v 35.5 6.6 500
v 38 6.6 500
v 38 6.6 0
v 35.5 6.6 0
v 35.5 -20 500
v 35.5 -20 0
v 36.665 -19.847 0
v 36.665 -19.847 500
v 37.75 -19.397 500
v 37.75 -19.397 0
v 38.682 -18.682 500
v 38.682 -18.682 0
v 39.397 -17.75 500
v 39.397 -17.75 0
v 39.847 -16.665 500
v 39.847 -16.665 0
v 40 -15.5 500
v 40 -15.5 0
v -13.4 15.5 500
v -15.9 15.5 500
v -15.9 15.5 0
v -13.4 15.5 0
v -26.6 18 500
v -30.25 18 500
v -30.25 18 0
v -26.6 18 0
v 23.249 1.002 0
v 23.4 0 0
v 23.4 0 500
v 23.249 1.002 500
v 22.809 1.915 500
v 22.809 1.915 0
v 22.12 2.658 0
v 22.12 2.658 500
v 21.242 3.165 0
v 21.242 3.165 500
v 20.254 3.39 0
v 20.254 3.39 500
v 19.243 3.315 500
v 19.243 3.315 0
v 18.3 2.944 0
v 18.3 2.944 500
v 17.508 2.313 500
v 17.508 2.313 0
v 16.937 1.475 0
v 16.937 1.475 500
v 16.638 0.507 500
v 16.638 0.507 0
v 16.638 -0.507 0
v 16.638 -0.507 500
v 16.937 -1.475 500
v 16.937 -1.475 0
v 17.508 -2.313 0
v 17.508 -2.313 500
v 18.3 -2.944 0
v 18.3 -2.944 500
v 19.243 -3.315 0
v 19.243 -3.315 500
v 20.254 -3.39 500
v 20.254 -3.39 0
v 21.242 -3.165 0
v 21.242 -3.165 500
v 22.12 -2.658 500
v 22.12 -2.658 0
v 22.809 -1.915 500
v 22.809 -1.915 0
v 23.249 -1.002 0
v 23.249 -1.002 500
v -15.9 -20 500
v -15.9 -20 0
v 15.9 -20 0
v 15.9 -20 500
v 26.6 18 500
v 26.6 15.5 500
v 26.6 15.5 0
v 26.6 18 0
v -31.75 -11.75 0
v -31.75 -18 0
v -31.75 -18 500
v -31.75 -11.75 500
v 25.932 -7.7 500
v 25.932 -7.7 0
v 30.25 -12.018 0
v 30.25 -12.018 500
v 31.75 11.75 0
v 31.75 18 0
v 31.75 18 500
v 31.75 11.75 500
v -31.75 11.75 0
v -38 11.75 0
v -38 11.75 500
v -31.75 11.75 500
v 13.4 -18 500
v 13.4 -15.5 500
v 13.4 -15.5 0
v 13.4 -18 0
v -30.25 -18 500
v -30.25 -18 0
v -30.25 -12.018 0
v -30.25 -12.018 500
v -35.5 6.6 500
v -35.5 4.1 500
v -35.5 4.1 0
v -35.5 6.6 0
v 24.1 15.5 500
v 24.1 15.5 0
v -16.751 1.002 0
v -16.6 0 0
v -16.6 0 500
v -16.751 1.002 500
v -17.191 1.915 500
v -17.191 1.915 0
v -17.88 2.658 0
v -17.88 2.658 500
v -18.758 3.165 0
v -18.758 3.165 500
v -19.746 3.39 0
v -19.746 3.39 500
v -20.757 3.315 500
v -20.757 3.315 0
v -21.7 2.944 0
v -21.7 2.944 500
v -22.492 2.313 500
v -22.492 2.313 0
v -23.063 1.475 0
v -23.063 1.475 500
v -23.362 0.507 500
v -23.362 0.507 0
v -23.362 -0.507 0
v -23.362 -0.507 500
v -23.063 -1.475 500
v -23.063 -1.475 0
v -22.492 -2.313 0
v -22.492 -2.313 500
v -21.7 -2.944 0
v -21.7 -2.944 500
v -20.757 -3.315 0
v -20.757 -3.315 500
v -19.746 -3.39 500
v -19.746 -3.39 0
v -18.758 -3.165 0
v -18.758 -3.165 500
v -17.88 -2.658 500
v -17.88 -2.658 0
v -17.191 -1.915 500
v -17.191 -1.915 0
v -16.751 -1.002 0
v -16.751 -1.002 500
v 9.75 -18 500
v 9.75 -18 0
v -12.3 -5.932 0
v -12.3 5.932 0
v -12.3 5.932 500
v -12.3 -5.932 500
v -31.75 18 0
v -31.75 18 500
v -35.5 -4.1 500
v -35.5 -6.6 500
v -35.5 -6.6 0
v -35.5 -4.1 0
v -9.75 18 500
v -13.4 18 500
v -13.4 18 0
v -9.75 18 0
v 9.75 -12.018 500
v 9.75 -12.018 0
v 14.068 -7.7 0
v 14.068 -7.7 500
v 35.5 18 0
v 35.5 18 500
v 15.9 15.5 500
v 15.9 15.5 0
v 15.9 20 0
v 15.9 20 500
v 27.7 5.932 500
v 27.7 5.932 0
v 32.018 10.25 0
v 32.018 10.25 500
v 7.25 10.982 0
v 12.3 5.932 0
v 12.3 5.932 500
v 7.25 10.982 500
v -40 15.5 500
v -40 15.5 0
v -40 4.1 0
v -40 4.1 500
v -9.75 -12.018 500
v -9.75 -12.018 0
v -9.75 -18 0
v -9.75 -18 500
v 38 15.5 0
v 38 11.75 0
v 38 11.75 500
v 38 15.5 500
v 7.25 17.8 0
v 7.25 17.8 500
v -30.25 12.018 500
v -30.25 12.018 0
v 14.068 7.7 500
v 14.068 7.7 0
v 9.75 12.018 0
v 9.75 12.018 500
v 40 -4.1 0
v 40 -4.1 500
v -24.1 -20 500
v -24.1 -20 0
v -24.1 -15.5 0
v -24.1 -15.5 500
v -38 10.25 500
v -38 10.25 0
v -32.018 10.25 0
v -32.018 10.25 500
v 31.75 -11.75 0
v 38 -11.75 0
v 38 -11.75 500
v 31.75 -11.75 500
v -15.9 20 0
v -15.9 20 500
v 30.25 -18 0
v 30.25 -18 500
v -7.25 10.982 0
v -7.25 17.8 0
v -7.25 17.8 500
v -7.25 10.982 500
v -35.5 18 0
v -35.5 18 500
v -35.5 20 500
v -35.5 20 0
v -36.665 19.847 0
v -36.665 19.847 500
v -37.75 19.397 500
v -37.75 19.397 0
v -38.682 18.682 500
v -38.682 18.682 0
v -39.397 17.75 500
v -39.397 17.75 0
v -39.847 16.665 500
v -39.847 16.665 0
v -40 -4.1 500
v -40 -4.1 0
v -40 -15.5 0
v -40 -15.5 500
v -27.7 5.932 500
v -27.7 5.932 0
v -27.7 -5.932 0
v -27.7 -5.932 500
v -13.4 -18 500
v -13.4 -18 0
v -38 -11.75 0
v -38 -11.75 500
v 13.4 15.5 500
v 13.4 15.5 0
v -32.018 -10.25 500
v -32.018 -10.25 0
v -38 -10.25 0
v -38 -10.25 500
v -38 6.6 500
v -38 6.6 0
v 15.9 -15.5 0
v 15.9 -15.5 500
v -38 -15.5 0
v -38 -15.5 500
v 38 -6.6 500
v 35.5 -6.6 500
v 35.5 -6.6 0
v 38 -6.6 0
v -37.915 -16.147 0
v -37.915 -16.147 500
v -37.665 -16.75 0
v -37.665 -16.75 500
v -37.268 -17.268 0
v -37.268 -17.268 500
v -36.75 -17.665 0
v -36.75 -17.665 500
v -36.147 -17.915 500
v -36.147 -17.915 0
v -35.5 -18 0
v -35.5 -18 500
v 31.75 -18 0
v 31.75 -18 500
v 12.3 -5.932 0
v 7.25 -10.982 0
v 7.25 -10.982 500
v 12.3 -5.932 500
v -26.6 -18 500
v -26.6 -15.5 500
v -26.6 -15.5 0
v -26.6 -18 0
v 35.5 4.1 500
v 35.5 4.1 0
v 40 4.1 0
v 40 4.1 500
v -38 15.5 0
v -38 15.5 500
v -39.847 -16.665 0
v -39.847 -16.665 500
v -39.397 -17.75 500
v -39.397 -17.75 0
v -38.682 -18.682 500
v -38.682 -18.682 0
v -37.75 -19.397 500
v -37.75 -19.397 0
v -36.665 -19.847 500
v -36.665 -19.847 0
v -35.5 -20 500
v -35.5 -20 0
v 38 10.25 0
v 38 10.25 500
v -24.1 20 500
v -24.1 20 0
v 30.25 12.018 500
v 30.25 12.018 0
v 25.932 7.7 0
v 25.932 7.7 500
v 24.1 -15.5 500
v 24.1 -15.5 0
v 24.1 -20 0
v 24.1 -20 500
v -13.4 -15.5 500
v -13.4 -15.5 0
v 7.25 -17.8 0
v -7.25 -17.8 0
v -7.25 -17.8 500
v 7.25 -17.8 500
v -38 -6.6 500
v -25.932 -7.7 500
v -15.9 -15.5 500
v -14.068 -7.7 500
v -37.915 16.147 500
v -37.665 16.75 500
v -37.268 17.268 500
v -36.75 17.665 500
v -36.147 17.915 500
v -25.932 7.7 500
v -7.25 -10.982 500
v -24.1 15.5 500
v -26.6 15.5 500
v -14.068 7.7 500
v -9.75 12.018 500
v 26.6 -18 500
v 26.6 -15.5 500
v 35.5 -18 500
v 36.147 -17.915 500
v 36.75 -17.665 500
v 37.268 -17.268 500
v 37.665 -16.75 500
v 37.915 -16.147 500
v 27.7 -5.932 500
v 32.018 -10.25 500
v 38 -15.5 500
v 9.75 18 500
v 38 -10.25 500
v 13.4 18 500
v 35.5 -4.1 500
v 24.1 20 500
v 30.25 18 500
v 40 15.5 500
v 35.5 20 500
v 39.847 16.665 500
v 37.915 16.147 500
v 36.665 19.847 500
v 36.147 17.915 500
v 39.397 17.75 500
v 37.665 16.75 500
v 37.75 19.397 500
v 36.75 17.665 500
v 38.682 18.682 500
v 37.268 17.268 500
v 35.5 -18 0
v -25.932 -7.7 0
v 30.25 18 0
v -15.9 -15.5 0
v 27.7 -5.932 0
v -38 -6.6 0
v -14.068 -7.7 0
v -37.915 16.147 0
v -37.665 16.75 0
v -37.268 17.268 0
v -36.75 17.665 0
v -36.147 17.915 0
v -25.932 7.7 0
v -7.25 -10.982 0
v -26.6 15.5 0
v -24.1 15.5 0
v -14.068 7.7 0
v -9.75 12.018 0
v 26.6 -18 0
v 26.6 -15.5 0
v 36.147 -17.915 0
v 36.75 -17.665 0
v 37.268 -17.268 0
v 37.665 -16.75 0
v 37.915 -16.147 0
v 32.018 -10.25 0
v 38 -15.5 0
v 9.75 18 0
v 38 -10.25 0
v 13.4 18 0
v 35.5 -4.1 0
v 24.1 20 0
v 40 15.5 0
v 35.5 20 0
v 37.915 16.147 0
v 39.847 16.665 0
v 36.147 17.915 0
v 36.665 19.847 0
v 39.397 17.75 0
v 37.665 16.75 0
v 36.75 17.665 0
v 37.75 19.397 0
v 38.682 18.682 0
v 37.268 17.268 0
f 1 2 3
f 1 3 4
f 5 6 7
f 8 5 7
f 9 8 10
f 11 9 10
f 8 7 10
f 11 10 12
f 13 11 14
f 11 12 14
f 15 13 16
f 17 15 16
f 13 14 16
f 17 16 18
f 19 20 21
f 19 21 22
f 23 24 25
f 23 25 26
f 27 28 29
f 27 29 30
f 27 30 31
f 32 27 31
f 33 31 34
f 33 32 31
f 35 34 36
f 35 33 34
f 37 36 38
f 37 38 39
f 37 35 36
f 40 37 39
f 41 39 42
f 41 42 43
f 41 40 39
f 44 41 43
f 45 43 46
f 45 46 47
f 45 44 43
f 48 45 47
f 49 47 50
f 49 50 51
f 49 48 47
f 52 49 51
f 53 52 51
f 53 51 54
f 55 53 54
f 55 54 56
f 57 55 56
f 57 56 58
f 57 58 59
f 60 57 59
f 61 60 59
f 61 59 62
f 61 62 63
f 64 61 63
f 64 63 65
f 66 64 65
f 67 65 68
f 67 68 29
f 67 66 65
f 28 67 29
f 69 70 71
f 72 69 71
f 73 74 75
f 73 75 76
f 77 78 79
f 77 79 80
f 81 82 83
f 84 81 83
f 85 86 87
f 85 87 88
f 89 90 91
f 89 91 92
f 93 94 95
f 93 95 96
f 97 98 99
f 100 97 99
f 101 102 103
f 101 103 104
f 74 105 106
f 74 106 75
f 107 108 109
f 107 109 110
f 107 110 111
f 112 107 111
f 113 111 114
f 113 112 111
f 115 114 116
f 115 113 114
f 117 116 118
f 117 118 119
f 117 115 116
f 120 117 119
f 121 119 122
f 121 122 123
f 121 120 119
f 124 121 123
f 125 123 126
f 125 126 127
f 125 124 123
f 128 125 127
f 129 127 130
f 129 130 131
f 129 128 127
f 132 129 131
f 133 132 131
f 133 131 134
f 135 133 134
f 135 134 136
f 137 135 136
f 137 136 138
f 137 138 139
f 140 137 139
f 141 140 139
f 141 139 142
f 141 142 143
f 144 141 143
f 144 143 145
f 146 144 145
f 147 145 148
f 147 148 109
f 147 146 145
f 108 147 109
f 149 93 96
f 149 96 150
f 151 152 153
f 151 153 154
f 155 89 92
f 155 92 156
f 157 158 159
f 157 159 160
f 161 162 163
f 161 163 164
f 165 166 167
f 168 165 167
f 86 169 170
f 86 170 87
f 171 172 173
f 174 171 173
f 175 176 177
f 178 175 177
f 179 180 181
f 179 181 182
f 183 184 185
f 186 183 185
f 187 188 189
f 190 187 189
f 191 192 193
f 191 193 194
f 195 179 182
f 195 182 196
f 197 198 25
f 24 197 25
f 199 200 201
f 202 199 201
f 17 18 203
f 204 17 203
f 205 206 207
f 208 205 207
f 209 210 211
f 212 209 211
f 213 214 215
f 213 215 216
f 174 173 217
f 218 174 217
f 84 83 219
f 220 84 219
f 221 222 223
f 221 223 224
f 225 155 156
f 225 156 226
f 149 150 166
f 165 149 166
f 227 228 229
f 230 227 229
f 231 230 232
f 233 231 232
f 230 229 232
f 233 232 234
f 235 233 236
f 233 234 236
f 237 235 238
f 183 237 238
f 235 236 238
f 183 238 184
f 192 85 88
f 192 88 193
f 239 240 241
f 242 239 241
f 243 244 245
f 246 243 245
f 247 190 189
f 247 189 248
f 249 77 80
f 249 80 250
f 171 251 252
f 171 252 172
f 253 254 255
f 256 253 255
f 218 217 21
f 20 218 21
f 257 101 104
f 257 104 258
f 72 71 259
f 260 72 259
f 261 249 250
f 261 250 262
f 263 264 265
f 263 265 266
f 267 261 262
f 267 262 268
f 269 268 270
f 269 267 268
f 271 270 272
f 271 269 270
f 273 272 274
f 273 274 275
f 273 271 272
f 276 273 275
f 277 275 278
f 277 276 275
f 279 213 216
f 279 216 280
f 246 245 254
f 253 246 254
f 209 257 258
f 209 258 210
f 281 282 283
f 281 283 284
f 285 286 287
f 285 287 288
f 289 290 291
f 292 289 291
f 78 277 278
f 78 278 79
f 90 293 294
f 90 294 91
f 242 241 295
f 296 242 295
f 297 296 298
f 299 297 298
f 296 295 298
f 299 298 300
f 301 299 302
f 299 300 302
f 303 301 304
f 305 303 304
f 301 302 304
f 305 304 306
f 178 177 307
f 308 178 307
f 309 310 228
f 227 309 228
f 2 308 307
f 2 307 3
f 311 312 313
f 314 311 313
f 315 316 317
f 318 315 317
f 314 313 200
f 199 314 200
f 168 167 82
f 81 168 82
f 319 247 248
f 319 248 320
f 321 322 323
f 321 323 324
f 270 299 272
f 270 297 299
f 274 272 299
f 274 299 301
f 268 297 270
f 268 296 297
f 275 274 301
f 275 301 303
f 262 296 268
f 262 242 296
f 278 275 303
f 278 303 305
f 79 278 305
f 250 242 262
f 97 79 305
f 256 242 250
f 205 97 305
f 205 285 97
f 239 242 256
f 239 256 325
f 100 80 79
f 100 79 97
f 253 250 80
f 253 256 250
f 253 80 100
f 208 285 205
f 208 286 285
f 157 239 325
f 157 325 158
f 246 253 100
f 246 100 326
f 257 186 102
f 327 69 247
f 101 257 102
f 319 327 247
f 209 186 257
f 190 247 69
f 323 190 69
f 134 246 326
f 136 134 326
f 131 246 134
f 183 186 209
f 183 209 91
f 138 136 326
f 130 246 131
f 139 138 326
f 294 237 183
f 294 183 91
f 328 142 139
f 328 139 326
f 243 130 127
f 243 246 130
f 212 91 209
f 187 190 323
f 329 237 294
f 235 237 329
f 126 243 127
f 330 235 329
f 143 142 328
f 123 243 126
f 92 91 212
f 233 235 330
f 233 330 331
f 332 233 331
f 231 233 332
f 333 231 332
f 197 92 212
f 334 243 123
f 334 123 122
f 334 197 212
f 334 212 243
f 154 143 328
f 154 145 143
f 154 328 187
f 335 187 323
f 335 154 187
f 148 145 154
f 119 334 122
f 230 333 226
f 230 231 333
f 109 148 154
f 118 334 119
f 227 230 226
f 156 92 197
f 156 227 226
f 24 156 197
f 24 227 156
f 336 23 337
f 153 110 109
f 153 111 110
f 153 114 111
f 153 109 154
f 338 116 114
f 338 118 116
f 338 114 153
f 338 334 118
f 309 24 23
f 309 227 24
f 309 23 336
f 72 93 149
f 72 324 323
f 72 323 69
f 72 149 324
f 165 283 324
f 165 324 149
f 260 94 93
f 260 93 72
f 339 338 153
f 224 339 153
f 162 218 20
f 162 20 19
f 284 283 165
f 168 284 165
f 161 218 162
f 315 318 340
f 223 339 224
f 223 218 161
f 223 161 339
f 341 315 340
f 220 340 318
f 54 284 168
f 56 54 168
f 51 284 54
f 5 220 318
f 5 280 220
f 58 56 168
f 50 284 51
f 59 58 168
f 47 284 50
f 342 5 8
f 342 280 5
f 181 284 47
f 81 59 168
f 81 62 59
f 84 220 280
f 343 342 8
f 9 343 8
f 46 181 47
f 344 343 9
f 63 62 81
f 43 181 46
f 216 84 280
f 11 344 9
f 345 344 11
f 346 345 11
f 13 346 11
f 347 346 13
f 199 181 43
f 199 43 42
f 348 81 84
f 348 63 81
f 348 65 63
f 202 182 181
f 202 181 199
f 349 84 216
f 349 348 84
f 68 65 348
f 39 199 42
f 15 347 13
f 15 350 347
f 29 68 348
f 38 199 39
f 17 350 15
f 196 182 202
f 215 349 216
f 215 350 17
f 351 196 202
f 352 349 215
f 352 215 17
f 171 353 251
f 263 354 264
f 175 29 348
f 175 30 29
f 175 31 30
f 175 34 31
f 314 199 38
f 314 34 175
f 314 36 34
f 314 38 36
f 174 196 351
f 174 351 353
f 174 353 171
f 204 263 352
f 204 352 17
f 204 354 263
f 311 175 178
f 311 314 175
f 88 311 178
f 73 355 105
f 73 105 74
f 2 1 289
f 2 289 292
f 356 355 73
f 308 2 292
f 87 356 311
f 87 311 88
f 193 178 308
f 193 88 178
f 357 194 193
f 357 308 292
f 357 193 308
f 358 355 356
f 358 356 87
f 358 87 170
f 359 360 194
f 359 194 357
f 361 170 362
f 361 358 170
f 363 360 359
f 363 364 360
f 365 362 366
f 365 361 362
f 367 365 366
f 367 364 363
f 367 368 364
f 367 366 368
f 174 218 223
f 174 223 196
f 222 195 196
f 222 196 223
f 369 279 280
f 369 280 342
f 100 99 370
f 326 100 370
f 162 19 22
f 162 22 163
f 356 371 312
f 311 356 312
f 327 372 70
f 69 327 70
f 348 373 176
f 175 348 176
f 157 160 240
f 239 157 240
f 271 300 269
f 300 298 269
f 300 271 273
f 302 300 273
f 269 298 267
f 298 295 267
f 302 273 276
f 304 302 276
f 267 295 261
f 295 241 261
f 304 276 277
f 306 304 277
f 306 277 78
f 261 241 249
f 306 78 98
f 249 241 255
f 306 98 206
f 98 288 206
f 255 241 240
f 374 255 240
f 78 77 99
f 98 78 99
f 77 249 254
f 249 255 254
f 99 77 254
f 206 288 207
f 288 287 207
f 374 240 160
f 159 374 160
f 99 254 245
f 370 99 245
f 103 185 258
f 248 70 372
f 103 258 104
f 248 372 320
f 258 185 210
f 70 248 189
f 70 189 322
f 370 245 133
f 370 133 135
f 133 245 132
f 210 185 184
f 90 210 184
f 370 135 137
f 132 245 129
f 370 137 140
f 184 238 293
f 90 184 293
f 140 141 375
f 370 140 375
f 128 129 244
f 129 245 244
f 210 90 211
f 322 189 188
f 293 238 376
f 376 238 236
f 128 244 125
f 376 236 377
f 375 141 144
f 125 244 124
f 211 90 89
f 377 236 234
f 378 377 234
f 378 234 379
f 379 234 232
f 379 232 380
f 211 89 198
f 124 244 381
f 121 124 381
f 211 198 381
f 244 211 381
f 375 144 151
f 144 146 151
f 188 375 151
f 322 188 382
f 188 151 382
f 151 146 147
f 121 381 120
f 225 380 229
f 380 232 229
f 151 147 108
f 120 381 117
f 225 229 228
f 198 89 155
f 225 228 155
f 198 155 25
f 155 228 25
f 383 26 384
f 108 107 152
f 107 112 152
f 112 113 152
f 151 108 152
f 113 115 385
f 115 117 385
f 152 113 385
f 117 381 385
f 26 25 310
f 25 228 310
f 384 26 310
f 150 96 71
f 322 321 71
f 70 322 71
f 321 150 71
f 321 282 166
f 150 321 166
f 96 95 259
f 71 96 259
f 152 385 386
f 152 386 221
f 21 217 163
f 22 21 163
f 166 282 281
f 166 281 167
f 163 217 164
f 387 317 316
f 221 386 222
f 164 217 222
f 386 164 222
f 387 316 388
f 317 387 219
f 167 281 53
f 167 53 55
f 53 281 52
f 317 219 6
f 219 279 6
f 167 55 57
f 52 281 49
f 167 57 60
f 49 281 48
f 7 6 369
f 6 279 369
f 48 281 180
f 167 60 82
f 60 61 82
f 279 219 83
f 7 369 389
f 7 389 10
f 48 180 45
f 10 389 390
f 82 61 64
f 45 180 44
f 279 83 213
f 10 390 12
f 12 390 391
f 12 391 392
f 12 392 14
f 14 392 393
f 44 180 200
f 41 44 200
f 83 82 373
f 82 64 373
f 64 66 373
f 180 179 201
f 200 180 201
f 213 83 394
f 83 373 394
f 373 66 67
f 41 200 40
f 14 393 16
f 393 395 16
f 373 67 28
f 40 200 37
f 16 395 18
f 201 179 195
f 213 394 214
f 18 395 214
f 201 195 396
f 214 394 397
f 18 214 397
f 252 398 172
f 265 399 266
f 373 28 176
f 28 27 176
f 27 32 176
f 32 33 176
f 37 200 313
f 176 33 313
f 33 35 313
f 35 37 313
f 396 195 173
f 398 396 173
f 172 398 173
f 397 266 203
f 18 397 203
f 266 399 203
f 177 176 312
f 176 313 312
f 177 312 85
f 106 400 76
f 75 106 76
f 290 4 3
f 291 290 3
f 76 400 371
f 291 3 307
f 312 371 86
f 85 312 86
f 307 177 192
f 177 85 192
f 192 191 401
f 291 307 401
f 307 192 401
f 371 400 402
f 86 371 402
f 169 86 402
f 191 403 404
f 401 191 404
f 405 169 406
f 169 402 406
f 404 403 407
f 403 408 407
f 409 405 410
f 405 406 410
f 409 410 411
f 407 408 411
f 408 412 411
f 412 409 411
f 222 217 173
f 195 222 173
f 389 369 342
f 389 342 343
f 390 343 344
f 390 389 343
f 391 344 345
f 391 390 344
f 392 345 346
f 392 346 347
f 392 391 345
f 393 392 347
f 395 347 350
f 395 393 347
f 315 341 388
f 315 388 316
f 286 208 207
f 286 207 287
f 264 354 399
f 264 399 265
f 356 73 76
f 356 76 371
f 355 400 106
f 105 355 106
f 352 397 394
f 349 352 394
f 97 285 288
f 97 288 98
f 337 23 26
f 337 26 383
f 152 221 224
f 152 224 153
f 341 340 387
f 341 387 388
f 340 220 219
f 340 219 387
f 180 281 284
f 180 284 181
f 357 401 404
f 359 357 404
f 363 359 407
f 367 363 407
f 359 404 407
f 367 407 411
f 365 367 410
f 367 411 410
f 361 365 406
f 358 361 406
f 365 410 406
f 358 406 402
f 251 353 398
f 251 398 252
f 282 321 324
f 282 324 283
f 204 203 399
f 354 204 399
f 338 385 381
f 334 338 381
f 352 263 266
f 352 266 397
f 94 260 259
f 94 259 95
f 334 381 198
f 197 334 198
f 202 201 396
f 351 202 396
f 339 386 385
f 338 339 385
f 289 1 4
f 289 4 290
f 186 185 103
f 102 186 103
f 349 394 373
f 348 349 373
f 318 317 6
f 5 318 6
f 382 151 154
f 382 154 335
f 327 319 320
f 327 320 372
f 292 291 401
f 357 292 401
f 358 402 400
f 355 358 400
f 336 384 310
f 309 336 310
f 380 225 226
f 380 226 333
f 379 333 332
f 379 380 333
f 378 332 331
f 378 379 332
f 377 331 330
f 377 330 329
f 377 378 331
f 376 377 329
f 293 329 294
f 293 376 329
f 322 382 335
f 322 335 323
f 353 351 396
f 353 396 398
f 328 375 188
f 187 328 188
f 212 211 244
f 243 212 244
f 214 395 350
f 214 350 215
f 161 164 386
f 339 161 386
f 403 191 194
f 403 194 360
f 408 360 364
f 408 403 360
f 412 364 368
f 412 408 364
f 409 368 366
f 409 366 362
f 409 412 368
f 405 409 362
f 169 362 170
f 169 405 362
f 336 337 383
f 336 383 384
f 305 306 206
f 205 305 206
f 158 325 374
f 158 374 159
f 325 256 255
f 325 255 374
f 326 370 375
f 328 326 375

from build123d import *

# Parameters (mm, degrees)
SKETCH1_R           = 3.4
BOSS_EXTRUDE1_DEPTH = 500


with BuildPart() as part:
    # Sketch1 → Boss-Extrude1 (new body)
    with BuildSketch(Plane.XY):
        with BuildLine():
            Line((24.1, -20), (35.5, -20))
            ThreePointArc((35.5, -20), (38.681980515, -18.681980515), (40, -15.5))
            Line((40, -15.5), (40, -4.1))
            Line((40, -4.1), (35.5, -4.1))
            Line((35.5, -4.1), (35.5, -6.6))
            Line((35.5, -6.6), (38, -6.6))
            Line((38, -6.6), (38, -10.25))
            Line((38, -10.25), (32.017766953, -10.25))
            Line((32.017766953, -10.25), (27.7, -5.932233047))
            Line((27.7, -5.932233047), (27.7, 5.932233047))
            Line((27.7, 5.932233047), (32.017766953, 10.25))
            Line((32.017766953, 10.25), (38, 10.25))
            Line((38, 10.25), (38, 6.6))
            Line((38, 6.6), (35.5, 6.6))
            Line((35.5, 6.6), (35.5, 4.1))
            Line((35.5, 4.1), (40, 4.1))
            Line((40, 4.1), (40, 15.5))
            ThreePointArc((40, 15.5), (38.681980515, 18.681980515), (35.5, 20))
            Line((35.5, 20), (24.1, 20))
            Line((24.1, 20), (24.1, 15.5))
            Line((24.1, 15.5), (26.6, 15.5))
            Line((26.6, 15.5), (26.6, 18))
            Line((26.6, 18), (30.25, 18))
            Line((30.25, 18), (30.25, 12.017766953))
            Line((30.25, 12.017766953), (25.932233047, 7.7))
            Line((25.932233047, 7.7), (14.067766953, 7.7))
            Line((14.067766953, 7.7), (9.75, 12.017766953))
            Line((9.75, 12.017766953), (9.75, 18))
            Line((9.75, 18), (13.4, 18))
            Line((13.4, 18), (13.4, 15.5))
            Line((13.4, 15.5), (15.9, 15.5))
            Line((15.9, 15.5), (15.9, 20))
            Line((15.9, 20), (-15.9, 20))
            Line((-15.9, 20), (-15.9, 15.5))
            Line((-15.9, 15.5), (-13.4, 15.5))
            Line((-13.4, 15.5), (-13.4, 18))
            Line((-13.4, 18), (-9.75, 18))
            Line((-9.75, 18), (-9.75, 12.017766953))
            Line((-9.75, 12.017766953), (-14.067766953, 7.7))
            Line((-14.067766953, 7.7), (-25.932233047, 7.7))
            Line((-25.932233047, 7.7), (-30.25, 12.017766953))
            Line((-30.25, 12.017766953), (-30.25, 18))
            Line((-30.25, 18), (-26.6, 18))
            Line((-26.6, 18), (-26.6, 15.5))
            Line((-26.6, 15.5), (-24.1, 15.5))
            Line((-24.1, 15.5), (-24.1, 20))
            Line((-24.1, 20), (-35.5, 20))
            ThreePointArc((-35.5, 20), (-38.681980515, 18.681980515), (-40, 15.5))
            Line((-40, 15.5), (-40, 4.1))
            Line((-40, 4.1), (-35.5, 4.1))
            Line((-35.5, 4.1), (-35.5, 6.6))
            Line((-35.5, 6.6), (-38, 6.6))
            Line((-38, 6.6), (-38, 10.25))
            Line((-38, 10.25), (-32.017766953, 10.25))
            Line((-32.017766953, 10.25), (-27.7, 5.932233047))
            Line((-27.7, 5.932233047), (-27.7, -5.932233047))
            Line((-27.7, -5.932233047), (-32.017766953, -10.25))
            Line((-32.017766953, -10.25), (-38, -10.25))
            Line((-38, -10.25), (-38, -6.6))
            Line((-38, -6.6), (-35.5, -6.6))
            Line((-35.5, -6.6), (-35.5, -4.1))
            Line((-35.5, -4.1), (-40, -4.1))
            Line((-40, -4.1), (-40, -15.5))
            ThreePointArc((-40, -15.5), (-38.681980515, -18.681980515), (-35.5, -20))
            Line((-35.5, -20), (-24.1, -20))
            Line((-24.1, -20), (-24.1, -15.5))
            Line((-24.1, -15.5), (-26.6, -15.5))
            Line((-26.6, -15.5), (-26.6, -18))
            Line((-26.6, -18), (-30.25, -18))
            Line((-30.25, -18), (-30.25, -12.017766953))
            Line((-30.25, -12.017766953), (-25.932233047, -7.7))
            Line((-25.932233047, -7.7), (-14.067766953, -7.7))
            Line((-14.067766953, -7.7), (-9.75, -12.017766953))
            Line((-9.75, -12.017766953), (-9.75, -18))
            Line((-9.75, -18), (-13.4, -18))
            Line((-13.4, -18), (-13.4, -15.5))
            Line((-13.4, -15.5), (-15.9, -15.5))
            Line((-15.9, -15.5), (-15.9, -20))
            Line((-15.9, -20), (15.9, -20))
            Line((15.9, -20), (15.9, -15.5))
            Line((15.9, -15.5), (13.4, -15.5))
            Line((13.4, -15.5), (13.4, -18))
            Line((13.4, -18), (9.75, -18))
            Line((9.75, -18), (9.75, -12.017766953))
            Line((9.75, -12.017766953), (14.067766953, -7.7))
            Line((14.067766953, -7.7), (25.932233047, -7.7))
            Line((25.932233047, -7.7), (30.25, -12.017766953))
            Line((30.25, -12.017766953), (30.25, -18))
            Line((30.25, -18), (26.6, -18))
            Line((26.6, -18), (26.6, -15.5))
            Line((26.6, -15.5), (24.1, -15.5))
            Line((24.1, -15.5), (24.1, -20))
        make_face()
        with Locations((-20, 0)):
            Circle(SKETCH1_R, mode=Mode.SUBTRACT)
        with Locations((20, 0)):
            Circle(SKETCH1_R, mode=Mode.SUBTRACT)
        with BuildLine():
            Line((38, -15.5), (38, -11.75))
            Line((38, -11.75), (31.75, -11.75))
            Line((31.75, -11.75), (31.75, -18))
            Line((31.75, -18), (35.5, -18))
            ThreePointArc((35.5, -18), (37.267766953, -17.267766953), (38, -15.5))
        make_face(mode=Mode.SUBTRACT)
        with BuildLine():
            Line((-38, 15.5), (-38, 11.75))
            Line((-38, 11.75), (-31.75, 11.75))
            Line((-31.75, 11.75), (-31.75, 18))
            Line((-31.75, 18), (-35.5, 18))
            ThreePointArc((-35.5, 18), (-37.267766953, 17.267766953), (-38, 15.5))
        make_face(mode=Mode.SUBTRACT)
        Polygon((-7.25, -10.982233047), (-7.25, -17.8), (7.25, -17.8), (7.25, -10.982233047), (12.3, -5.932233047), (12.3, 5.932233047), (7.25, 10.982233047), (7.25, 17.8), (-7.25, 17.8), (-7.25, 10.982233047), (-12.3, 5.932233047), (-12.3, -5.932233047), align=None, mode=Mode.SUBTRACT)
        with BuildLine():
            Line((-35.5, -18), (-31.75, -18))
            Line((-31.75, -18), (-31.75, -11.75))
            Line((-31.75, -11.75), (-38, -11.75))
            Line((-38, -11.75), (-38, -15.5))
            ThreePointArc((-38, -15.5), (-37.267766953, -17.267766953), (-35.5, -18))
        make_face(mode=Mode.SUBTRACT)
        with BuildLine():
            Line((35.5, 18), (31.75, 18))
            Line((31.75, 18), (31.75, 11.75))
            Line((31.75, 11.75), (38, 11.75))
            Line((38, 11.75), (38, 15.5))
            ThreePointArc((38, 15.5), (37.267766953, 17.267766953), (35.5, 18))
        make_face(mode=Mode.SUBTRACT)
    extrude(amount=BOSS_EXTRUDE1_DEPTH)


solid = part.part
